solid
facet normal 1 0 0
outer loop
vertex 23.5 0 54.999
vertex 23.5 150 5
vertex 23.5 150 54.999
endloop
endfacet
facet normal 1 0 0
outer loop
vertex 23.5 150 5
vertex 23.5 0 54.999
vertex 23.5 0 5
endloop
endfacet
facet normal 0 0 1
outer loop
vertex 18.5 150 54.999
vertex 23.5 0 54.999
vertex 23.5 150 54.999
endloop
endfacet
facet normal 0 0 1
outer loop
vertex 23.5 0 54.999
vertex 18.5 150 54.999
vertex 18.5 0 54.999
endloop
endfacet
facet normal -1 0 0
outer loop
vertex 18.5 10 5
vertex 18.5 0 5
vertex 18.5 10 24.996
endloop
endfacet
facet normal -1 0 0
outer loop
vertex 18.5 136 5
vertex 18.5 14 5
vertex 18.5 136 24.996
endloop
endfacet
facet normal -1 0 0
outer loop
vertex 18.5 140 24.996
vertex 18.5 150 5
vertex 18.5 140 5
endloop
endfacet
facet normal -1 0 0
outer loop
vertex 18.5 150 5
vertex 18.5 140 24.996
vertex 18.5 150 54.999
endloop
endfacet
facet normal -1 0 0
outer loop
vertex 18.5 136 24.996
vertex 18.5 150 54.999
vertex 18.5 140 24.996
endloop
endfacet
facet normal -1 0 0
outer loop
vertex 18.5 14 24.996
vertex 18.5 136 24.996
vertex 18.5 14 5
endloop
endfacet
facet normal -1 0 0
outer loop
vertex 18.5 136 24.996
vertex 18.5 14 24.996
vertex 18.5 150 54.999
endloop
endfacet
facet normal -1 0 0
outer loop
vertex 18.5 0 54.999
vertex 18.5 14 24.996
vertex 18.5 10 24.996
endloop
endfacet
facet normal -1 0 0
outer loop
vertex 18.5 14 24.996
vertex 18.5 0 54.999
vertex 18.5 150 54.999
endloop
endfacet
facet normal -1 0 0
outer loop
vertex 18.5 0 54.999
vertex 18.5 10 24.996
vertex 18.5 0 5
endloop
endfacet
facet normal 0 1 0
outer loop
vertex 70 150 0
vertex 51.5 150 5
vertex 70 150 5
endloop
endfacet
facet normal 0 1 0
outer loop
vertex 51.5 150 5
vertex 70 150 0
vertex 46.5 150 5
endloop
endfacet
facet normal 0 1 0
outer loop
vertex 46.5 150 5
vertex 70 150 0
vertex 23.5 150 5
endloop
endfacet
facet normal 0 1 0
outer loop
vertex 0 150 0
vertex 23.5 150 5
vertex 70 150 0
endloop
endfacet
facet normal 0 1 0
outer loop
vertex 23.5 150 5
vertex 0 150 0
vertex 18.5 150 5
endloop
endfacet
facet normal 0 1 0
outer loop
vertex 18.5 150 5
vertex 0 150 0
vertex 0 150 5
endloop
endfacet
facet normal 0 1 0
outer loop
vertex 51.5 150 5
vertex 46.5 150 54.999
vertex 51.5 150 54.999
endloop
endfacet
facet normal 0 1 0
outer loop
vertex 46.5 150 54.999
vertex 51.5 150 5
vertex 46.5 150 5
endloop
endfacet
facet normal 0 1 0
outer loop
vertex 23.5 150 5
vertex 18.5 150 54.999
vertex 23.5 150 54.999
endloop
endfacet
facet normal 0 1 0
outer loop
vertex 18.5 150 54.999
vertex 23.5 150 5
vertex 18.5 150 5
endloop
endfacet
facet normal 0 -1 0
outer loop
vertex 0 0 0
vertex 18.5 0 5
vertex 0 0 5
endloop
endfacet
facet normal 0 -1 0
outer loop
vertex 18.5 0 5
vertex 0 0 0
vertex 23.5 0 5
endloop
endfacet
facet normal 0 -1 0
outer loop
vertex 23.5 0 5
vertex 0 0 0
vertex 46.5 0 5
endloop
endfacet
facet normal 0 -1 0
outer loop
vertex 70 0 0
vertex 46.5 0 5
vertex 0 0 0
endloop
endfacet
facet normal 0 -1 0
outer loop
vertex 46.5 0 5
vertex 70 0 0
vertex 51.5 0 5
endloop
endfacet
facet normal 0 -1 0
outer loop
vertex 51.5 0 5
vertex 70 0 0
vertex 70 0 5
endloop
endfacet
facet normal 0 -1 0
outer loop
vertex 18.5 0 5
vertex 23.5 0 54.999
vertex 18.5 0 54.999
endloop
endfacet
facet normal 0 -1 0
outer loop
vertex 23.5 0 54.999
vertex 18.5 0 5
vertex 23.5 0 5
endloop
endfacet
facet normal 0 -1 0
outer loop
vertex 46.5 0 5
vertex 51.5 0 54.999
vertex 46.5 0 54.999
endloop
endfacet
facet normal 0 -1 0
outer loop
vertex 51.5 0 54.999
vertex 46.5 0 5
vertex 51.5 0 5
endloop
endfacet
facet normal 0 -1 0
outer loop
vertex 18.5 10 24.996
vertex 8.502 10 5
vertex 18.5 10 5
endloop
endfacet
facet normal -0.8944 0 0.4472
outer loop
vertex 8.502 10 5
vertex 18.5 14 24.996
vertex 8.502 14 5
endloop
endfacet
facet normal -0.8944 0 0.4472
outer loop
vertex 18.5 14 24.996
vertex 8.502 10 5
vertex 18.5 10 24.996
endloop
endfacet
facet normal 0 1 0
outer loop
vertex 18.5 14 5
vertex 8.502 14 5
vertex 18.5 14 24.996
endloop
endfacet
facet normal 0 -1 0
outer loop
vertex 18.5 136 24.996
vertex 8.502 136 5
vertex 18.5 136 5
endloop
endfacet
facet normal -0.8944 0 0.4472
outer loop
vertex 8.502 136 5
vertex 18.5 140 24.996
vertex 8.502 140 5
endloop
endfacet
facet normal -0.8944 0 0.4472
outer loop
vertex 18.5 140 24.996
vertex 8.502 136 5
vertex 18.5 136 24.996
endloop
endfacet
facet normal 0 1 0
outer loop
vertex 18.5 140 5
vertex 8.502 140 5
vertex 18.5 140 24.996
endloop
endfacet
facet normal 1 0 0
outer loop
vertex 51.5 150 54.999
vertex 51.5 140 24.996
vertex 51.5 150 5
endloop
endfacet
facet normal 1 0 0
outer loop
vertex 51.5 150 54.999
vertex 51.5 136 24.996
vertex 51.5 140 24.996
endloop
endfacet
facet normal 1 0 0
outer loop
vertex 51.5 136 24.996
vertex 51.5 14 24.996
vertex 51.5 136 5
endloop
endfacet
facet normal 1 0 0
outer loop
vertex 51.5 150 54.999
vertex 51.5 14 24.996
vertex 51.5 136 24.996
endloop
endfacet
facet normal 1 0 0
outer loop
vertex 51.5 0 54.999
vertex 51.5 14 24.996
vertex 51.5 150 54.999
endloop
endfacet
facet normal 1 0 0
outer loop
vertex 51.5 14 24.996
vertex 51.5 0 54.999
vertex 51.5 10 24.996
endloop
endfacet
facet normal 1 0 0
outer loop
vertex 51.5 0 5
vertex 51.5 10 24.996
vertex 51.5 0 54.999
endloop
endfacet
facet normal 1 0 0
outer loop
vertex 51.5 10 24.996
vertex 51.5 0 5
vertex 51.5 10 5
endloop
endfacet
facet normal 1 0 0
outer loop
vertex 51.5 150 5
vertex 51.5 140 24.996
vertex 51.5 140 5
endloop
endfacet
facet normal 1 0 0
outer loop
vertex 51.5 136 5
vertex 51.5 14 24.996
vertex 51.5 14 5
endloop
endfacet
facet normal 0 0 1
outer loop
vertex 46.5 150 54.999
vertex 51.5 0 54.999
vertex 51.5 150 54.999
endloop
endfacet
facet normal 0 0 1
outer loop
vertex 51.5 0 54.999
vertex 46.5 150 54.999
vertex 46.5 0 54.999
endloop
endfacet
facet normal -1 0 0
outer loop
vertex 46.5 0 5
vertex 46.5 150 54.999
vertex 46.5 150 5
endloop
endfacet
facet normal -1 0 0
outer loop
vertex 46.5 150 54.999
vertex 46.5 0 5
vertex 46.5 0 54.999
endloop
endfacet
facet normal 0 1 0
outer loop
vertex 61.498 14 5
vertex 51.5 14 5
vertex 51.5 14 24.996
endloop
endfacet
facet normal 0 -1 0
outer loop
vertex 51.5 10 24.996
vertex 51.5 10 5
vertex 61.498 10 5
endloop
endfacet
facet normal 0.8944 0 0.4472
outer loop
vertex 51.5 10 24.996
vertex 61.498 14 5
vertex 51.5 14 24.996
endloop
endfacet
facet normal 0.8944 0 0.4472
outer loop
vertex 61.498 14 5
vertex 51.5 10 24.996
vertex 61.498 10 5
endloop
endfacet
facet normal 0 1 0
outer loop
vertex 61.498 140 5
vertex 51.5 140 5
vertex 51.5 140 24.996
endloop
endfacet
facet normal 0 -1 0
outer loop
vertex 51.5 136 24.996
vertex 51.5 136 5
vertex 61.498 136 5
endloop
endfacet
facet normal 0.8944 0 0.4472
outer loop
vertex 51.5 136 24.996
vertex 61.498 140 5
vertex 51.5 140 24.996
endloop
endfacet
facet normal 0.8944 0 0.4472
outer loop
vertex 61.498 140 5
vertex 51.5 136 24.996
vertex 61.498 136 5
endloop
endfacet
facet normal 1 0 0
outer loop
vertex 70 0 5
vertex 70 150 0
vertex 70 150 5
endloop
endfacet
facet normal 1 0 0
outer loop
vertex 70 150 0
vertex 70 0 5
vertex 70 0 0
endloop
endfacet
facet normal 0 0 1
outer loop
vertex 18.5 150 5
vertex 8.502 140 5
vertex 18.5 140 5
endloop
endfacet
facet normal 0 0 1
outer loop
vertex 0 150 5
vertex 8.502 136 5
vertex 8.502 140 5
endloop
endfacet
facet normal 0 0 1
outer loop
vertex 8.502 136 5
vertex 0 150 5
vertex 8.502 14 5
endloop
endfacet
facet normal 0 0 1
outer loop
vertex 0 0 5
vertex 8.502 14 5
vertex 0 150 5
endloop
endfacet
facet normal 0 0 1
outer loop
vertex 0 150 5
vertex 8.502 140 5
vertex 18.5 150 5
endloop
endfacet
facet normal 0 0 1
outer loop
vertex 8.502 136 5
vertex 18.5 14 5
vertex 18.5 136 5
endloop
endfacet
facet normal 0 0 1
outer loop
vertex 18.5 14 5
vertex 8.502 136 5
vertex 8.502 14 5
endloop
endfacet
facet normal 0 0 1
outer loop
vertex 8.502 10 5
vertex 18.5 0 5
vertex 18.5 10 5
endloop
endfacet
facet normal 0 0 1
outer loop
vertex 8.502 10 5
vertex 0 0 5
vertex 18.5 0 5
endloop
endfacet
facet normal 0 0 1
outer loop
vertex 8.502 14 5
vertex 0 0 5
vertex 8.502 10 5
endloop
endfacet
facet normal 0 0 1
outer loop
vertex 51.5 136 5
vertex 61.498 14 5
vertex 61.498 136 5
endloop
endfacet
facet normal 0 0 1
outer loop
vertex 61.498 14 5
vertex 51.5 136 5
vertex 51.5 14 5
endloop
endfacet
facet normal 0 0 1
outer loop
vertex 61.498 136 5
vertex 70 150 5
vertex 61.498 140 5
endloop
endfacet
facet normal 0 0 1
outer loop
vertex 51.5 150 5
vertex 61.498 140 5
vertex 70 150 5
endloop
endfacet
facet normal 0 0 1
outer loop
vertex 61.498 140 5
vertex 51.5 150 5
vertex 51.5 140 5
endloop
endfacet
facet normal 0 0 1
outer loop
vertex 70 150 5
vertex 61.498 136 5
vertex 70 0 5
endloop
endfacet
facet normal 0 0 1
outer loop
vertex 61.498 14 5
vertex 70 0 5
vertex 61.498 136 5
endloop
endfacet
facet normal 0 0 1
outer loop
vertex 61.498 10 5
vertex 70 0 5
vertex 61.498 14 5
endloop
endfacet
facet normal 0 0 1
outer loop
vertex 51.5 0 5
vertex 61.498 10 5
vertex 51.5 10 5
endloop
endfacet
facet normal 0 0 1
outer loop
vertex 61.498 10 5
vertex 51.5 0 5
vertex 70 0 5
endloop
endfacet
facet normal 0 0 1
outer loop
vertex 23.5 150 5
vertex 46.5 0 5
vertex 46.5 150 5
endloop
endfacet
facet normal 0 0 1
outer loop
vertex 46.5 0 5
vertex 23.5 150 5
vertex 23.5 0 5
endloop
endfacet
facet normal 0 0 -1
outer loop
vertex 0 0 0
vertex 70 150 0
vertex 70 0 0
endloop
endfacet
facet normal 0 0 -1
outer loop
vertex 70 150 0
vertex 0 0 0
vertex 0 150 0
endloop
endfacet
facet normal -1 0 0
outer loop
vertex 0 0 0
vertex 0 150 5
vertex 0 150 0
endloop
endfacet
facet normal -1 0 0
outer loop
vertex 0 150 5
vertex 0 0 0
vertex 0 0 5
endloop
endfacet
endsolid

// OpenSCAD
$fa = 1;
$fs = 0.4;

PC_MOUNT_WIDTH = 23;
PC_MOUNT_LEN = 150;

module base() {
  color("#6a5acd") { cube(size = [ 70, PC_MOUNT_LEN, 5 ], center = false); }
}

module side() {
  color("#54FF9F") { cube(size = [ 5, PC_MOUNT_LEN, 50 ], center = false); }
}

module triangle() {
  points = [ [ 0, 0 ], [ 10, 0 ], [ 0, 20 ] ]; // 三角形的三个顶点坐标
  thickness = 4;                               // 多边形的厚度
  color("#EEEE00") { linear_extrude(height = thickness) polygon(points); }
}

module left_side() {
  side();
  translate([ 0.001, 10, -0.001 ]) rotate([ 90, 0, 180 ]) { triangle(); }
  translate([ 0.001, PC_MOUNT_LEN - 10 - 4, -0.001 ]) rotate([ 90, 0, 180 ]) {
    triangle();
  }
}

module right_side() {
  side();
  translate([ 5 - 0.001, 10 + 4, -0.001 ]) rotate([ 90, 0, 0 ]) { triangle(); }
  translate([ 5 - 0.001, PC_MOUNT_LEN - 10, -0.001 ]) rotate([ 90, 0, 0 ]) {
    triangle();
  }
}

module vertical_wall(spacing = 0) {
  translate([ 70 / 2 - (spacing / 2) - 5, 0, 5 - 0.001 ]) left_side();
  translate([ 70 / 2 + spacing / 2, 0, 5 - 0.001 ]) right_side();
}

union() {
  base();
  vertical_wall(PC_MOUNT_WIDTH);
}
